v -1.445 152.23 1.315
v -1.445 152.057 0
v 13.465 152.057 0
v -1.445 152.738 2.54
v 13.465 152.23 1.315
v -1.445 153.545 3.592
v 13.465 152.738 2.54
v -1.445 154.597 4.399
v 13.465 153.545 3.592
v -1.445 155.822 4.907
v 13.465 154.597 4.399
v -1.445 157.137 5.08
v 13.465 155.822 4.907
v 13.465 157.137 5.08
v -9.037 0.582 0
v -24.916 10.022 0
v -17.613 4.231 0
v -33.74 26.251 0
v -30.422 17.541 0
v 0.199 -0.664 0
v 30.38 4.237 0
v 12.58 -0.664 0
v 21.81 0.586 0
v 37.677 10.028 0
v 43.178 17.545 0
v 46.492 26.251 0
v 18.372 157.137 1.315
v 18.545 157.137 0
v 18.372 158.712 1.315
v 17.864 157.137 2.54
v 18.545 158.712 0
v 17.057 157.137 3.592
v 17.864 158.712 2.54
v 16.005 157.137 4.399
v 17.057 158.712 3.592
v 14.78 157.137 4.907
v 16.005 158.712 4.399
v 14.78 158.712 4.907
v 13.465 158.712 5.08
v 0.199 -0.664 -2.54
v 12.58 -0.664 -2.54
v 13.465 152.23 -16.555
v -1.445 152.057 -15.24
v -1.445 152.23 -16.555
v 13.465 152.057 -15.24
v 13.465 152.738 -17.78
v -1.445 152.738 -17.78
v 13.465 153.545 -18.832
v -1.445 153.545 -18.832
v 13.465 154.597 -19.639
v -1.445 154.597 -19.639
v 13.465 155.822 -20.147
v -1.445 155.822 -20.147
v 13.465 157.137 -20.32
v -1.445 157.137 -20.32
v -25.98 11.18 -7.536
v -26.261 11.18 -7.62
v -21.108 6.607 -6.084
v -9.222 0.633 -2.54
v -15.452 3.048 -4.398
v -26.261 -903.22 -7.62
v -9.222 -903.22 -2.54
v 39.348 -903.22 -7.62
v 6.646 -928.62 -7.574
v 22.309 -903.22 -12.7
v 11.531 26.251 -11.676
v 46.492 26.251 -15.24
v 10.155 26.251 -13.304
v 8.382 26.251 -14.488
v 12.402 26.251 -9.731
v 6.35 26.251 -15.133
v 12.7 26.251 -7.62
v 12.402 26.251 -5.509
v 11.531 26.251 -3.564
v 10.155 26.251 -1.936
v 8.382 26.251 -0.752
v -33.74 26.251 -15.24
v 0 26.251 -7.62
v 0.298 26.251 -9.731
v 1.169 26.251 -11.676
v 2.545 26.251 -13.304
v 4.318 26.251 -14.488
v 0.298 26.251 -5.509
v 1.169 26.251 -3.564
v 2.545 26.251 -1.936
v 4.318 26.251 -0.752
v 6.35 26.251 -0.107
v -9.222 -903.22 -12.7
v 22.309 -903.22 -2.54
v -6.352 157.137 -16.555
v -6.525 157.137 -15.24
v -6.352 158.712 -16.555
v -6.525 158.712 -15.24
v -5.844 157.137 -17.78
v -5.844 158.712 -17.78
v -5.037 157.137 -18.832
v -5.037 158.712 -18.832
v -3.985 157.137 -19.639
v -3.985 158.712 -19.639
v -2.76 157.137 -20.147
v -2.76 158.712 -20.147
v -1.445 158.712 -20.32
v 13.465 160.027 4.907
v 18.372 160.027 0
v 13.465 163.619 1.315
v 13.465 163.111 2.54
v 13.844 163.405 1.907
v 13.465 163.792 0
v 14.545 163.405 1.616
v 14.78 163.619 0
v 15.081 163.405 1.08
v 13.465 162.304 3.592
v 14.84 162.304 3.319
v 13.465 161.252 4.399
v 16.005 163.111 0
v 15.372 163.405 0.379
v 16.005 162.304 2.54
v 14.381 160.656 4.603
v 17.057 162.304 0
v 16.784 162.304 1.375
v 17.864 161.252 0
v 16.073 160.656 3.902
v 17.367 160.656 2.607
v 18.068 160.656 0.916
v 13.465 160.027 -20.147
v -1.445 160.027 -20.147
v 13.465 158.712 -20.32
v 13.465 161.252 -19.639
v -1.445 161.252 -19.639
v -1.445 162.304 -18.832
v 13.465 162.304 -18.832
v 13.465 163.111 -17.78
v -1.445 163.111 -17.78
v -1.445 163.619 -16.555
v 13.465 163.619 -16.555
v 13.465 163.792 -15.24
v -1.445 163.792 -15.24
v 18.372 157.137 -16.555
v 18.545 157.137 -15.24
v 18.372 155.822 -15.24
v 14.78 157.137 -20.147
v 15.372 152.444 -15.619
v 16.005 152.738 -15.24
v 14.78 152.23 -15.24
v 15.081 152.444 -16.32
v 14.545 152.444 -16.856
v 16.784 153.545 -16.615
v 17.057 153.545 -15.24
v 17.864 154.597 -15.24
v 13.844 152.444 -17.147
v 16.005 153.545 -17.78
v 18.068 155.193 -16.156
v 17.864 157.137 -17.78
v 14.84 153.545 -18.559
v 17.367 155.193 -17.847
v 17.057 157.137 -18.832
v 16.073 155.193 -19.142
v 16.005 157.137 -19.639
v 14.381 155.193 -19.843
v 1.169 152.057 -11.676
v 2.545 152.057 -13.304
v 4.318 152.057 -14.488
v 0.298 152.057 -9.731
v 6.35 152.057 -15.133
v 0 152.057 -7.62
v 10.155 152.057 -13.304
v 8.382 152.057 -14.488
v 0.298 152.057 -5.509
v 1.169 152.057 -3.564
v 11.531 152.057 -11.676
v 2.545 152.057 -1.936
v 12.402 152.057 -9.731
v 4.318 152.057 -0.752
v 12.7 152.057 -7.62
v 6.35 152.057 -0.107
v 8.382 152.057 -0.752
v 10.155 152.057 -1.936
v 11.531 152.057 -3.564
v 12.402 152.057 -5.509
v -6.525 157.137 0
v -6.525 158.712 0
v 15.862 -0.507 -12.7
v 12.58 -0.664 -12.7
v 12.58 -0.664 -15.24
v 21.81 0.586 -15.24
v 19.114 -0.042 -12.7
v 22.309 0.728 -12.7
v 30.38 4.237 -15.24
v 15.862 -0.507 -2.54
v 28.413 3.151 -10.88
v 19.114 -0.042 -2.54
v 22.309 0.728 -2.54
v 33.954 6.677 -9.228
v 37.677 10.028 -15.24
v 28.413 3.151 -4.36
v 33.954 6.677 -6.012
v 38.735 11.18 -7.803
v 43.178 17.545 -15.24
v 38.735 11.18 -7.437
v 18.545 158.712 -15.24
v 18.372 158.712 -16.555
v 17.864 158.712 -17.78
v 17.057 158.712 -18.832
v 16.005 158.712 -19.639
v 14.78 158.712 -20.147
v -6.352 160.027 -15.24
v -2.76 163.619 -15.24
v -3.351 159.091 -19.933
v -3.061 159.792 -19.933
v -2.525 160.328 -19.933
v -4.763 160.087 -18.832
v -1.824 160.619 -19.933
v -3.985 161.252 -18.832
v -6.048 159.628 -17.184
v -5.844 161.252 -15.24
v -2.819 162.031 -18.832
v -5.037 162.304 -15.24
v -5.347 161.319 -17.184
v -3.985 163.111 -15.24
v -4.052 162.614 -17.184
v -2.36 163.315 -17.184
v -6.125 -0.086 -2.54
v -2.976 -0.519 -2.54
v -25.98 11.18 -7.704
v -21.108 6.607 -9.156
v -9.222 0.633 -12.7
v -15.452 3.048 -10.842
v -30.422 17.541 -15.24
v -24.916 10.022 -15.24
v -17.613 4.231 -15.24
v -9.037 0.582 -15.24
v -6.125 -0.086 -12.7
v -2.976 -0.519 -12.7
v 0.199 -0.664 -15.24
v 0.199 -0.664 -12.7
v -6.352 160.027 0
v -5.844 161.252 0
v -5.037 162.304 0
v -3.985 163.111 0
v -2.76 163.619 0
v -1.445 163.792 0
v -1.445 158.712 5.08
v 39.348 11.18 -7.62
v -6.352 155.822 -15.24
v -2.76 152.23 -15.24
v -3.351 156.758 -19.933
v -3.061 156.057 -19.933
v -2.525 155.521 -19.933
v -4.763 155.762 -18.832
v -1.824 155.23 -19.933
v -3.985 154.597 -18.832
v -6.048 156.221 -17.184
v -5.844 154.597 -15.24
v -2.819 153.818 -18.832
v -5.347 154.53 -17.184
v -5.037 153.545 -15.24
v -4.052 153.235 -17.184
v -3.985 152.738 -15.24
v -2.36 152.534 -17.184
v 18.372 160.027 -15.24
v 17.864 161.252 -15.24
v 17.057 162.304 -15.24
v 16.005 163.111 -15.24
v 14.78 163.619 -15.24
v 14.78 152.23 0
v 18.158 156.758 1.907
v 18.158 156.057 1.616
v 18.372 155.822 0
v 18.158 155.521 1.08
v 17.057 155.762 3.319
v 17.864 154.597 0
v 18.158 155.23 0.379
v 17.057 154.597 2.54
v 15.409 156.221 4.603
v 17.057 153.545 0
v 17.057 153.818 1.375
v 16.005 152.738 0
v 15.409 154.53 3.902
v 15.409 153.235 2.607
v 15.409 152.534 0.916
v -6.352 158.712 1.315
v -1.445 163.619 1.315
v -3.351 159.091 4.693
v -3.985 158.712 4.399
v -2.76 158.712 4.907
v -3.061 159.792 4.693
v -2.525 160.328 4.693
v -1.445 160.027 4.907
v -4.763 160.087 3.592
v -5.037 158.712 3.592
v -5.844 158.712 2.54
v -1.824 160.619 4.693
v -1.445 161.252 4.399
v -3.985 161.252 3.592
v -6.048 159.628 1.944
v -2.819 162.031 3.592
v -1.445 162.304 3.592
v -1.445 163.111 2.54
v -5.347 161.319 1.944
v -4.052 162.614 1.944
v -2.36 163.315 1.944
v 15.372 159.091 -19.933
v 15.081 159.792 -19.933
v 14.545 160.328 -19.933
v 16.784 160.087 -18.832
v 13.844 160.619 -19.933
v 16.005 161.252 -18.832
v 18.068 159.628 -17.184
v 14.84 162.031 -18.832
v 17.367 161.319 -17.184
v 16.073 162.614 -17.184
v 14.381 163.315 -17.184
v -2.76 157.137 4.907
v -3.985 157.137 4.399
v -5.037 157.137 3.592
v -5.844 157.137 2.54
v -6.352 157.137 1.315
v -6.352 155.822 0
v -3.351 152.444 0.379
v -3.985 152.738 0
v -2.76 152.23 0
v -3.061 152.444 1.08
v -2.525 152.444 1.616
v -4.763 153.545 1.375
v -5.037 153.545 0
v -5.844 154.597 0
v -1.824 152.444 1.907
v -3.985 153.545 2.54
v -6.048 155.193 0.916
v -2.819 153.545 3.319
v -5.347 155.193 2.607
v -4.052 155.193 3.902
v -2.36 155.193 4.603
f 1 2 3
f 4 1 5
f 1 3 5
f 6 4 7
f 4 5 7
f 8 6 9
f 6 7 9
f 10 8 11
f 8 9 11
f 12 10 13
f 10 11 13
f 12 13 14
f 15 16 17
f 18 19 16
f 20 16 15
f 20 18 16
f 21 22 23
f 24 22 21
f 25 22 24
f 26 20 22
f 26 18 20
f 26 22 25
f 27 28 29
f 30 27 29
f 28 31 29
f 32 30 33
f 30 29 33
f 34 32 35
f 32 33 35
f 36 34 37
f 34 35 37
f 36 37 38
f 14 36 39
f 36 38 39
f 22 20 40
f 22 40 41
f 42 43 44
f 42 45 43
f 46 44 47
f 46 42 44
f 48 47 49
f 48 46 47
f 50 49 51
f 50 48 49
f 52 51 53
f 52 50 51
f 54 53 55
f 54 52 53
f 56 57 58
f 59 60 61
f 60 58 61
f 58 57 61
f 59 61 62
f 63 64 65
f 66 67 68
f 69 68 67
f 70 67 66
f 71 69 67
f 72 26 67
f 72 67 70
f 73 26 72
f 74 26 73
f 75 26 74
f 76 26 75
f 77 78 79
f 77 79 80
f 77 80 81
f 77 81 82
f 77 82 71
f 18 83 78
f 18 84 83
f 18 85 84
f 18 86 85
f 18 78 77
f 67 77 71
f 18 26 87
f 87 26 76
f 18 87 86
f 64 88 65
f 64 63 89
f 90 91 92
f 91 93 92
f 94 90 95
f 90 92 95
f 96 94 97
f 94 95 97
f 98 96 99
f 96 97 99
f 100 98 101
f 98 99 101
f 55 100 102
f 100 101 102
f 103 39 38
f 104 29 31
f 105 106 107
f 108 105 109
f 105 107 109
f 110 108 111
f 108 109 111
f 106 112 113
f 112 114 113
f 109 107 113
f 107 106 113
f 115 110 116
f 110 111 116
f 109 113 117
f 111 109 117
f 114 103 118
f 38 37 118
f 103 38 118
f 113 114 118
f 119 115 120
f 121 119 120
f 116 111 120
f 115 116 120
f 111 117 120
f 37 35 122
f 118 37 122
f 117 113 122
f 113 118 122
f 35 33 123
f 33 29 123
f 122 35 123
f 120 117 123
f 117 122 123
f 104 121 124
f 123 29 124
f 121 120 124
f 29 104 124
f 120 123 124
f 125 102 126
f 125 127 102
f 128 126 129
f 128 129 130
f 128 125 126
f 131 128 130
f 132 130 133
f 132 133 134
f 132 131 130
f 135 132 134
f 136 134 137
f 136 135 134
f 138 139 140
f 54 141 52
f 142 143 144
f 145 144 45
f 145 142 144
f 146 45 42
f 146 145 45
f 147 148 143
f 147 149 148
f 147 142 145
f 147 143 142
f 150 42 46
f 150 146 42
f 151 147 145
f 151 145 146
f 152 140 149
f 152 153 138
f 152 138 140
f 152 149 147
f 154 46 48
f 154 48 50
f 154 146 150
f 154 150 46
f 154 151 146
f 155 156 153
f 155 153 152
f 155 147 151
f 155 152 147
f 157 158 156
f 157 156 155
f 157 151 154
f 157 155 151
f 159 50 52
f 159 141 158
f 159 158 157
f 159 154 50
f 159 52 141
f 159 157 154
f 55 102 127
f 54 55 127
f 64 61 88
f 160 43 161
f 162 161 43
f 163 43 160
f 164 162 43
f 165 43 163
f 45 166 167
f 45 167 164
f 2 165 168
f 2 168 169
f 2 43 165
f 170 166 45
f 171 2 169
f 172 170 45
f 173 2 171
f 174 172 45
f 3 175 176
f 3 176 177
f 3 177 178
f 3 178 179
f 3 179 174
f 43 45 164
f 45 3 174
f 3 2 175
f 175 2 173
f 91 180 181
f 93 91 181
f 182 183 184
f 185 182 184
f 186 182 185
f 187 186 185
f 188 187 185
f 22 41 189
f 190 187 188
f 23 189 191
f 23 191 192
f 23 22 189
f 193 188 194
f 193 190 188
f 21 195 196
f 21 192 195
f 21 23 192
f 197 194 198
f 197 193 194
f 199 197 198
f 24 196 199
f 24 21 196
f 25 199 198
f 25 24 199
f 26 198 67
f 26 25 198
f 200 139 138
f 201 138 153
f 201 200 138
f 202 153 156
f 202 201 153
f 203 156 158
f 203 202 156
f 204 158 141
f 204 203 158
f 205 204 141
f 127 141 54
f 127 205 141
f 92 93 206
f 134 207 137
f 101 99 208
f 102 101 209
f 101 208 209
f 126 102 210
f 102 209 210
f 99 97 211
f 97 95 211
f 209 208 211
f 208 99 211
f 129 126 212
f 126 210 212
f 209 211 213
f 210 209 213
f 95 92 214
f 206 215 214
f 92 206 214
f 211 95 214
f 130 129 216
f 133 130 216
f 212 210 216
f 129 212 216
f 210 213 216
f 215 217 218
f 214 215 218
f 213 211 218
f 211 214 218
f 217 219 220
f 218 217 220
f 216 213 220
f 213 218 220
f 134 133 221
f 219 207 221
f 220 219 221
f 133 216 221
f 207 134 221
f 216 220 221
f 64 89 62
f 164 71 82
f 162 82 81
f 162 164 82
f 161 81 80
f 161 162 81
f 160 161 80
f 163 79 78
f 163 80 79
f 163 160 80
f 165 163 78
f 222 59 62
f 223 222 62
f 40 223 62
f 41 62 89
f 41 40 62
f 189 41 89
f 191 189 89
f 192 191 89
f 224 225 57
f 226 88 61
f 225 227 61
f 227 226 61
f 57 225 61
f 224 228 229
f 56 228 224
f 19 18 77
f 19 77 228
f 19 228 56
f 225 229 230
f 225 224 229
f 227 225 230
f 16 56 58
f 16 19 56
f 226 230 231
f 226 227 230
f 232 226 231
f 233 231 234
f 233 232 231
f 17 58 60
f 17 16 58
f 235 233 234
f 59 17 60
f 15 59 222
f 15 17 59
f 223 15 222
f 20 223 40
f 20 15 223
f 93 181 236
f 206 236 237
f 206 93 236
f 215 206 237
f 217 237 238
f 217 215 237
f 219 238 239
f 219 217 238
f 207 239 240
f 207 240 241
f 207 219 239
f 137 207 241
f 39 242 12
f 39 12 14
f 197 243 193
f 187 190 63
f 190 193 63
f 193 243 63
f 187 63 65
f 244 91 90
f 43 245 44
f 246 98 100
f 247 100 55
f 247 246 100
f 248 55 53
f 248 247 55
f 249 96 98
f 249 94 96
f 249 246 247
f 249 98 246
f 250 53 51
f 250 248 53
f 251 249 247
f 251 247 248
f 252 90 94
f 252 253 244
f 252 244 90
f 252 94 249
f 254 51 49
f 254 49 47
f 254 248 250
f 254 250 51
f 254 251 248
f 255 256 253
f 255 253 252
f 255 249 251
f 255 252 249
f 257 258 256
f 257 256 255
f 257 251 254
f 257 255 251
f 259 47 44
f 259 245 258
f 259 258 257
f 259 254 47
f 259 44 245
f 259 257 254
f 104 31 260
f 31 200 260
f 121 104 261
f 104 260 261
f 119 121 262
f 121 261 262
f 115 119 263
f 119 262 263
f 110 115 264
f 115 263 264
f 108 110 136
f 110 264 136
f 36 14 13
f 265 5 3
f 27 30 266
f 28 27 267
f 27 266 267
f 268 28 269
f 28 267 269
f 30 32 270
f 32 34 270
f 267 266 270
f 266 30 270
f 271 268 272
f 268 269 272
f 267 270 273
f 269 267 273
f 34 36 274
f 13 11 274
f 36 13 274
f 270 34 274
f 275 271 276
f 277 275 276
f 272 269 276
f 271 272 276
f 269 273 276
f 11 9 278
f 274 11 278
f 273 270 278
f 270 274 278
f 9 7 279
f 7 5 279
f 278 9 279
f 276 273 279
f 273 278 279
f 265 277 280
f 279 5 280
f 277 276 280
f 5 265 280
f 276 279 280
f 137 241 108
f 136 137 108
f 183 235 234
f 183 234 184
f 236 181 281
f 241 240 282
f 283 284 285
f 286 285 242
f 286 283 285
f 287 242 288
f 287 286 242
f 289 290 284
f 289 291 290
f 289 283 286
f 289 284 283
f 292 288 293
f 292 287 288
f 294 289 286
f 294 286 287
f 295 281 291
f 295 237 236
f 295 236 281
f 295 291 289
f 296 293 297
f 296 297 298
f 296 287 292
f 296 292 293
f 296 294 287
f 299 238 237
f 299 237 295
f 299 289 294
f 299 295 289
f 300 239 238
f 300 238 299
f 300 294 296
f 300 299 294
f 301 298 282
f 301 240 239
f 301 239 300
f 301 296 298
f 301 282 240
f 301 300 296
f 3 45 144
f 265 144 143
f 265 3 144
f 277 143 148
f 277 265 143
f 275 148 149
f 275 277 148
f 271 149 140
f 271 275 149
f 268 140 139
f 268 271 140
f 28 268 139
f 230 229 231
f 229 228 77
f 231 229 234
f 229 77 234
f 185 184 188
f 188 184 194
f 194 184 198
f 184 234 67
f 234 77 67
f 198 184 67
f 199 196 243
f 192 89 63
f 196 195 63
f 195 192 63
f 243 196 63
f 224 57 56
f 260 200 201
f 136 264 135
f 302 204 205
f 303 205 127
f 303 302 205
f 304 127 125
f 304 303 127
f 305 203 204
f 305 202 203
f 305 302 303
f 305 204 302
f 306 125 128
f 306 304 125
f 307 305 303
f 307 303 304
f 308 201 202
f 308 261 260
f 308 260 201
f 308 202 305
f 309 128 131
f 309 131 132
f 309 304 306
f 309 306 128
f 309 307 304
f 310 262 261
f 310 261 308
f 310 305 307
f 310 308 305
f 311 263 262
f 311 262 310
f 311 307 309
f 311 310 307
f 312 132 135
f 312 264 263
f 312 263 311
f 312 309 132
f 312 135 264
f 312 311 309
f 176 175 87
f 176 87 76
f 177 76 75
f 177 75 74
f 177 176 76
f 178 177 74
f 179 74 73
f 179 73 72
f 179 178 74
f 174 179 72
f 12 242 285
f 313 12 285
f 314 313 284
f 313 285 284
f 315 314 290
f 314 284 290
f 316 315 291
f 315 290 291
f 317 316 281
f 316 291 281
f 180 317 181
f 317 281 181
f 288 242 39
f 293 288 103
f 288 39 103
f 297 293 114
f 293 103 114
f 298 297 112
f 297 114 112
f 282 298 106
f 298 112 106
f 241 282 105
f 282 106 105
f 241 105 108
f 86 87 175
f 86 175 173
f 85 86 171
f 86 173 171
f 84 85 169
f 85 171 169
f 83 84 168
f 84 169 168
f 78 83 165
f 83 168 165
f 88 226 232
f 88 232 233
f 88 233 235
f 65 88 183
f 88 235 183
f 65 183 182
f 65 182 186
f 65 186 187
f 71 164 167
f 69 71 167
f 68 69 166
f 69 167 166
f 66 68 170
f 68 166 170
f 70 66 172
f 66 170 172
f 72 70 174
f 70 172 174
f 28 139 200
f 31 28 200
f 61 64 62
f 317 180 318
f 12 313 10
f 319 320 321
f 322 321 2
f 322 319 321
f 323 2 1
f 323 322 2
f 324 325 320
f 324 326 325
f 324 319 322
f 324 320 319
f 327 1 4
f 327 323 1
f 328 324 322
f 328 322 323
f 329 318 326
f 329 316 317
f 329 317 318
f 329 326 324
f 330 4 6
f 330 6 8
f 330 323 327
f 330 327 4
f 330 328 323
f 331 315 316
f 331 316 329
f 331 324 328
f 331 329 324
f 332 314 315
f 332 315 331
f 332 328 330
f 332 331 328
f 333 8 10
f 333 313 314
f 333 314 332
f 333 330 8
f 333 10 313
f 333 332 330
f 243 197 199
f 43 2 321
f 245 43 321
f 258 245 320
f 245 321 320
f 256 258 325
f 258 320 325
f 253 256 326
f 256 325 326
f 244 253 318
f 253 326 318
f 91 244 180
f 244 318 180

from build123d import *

# Parameters (mm, degrees)
F0_W          = 152.4
F0_H          = 15.24
F1_DEPTH      = 12.7
F2_T1_DEPTH   = 190.5
F4_W          = 25.0697992742
F4_H          = 11.7348134518
F5_DEPTH      = 12.7
F5_DEPTH_BACK = 12.7
F7_DEPTH      = 7.62
F7_DEPTH_BACK = 7.62
F8_W          = 65.6082034111
F8_H          = 914.4
F9_DEPTH      = 5.08
F9_DEPTH_BACK = 5.08
F11_DEPTH     = 914.4
F12_DEPTH     = 12.7
F16_R         = 5.08


# Not quite as in the source:
# - a fillet or chamfer that OpenCascade refuses, or shapes differently, is made with other operations: its cross-section is extruded or revolved along the edge and cut away or added


with BuildPart() as f1:
    # F0 (on Right) → F1 (new body)
    with BuildSketch(Plane.YZ):
        with Locations((76.2, -7.62)):
            Rectangle(F0_W, F0_H)
    extrude(amount=F1_DEPTH)

    # F2: fillet of radius 7.62 on 4 edges, made by hand

    # F2_s2 → F2_t1 (cut)
    with BuildSketch(Plane.XZ.offset(-171.45)):
        with BuildLine():
            ThreePointArc((7.62, 0), (2.2318463274, -2.2318463274), (0, -7.62))
            Line((0, -7.62), (0, 0))
            Line((0, 0), (7.62, 0))
        make_face()
        with BuildLine():
            ThreePointArc((7.62, -15.24), (2.2318463274, -13.0081536726), (0, -7.62))
            Line((0, -7.62), (0, -15.24))
            Line((0, -15.24), (7.62, -15.24))
        make_face()
        with BuildLine():
            ThreePointArc((5.08, 0), (10.4681536726, -2.2318463274), (12.7, -7.62))
            Line((12.7, -7.62), (12.7, 0))
            Line((12.7, 0), (5.08, 0))
        make_face()
        with BuildLine():
            ThreePointArc((5.08, -15.24), (10.4681536726, -13.0081536726), (12.7, -7.62))
            Line((12.7, -7.62), (12.7, -15.24))
            Line((12.7, -15.24), (5.08, -15.24))
        make_face()
    extrude(amount=F2_T1_DEPTH, mode=Mode.SUBTRACT)

    # F4 (on offset) → F5 (join, two sides)
    with BuildSketch(Plane.XY.offset(-7.62)) as f5_sk:
        with Locations((6.0101542622, 157.924503088)):
            Rectangle(F4_W, F4_H)
    extrude(amount=F5_DEPTH)
    extrude(f5_sk.sketch, amount=-F5_DEPTH_BACK)

    # F6 (on offset) → F7 (join, two sides)
    with BuildSketch(Plane.XY.offset(-7.62)) as f7_sk:
        with BuildLine():
            Line((6.3893780661, -0.6641601572), (12.5797659928, -0.6641601572))
            ThreePointArc((12.5797659928, -0.6641601572), (34.2227463889, 6.8879561013), (46.4923181534, 26.2505661817))
            Line((46.4923181534, 26.2505661817), (6.3893780661, 26.2505661817))
            Line((6.3893780661, 26.2505661817), (6.3893780661, -0.6641601572))
        make_face()
        with BuildLine():
            Line((0.1989901393, -0.6641601572), (6.3893780661, -0.6641601572))
            Line((6.3893780661, -0.6641601572), (6.3893780661, 26.2505661817))
            Line((6.3893780661, 26.2505661817), (-33.7397263339, 26.2505661817))
            ThreePointArc((-33.7397263339, 26.2505661817), (-21.4587969692, 6.8812254508), (0.1989901393, -0.6641601572))
        make_face()
    extrude(amount=F7_DEPTH)
    extrude(f7_sk.sketch, amount=-F7_DEPTH_BACK)

    # F8 (on offset) → F9 (join, two sides)
    with BuildSketch(Plane.XY.offset(-7.62)) as f9_sk:
        with Locations((6.5435543656, -446.0204662129)):
            Rectangle(F8_W, F8_H)
    extrude(amount=-F9_DEPTH)
    extrude(f9_sk.sketch, amount=F9_DEPTH_BACK)

    # F10 (on face) → F11 (cut)
    with BuildSketch(Plane.XZ.offset(903.2204662129)):
        Polygon((-26.2605473399, -2.54), (-26.2605473399, -7.62), (-9.2217093514, -2.54), align=None)
        Polygon((-9.2217093514, -12.7), (-26.2605473399, -7.62), (-26.2605473399, -12.7), align=None)
        Polygon((39.3476560712, -7.62), (22.3088180826, -12.7), (39.3476560712, -12.7), align=None)
        Polygon((39.3476560712, -2.54), (22.3088180826, -2.54), (39.3476560712, -7.62), align=None)
    extrude(amount=-F11_DEPTH, mode=Mode.SUBTRACT)

    # F12 (add): a face of the model
    f12_faces = [f1.faces().sort_by_distance(p)[0] for p in [
        (6.3771735992, 14.5847815456, 0),
    ]]
    extrude(f12_faces, amount=-F12_DEPTH)

    # F9_face (on face) → F15 section 0
    with BuildSketch(Plane(origin=(6.5435543656, -903.2204662129, -7.62), x_dir=(1, 0, 0), z_dir=(0, -1, 0)), mode=Mode.PRIVATE) as f15_s0:
        Polygon((-32.8041017056, 0), (-15.765263717, -5.08), (15.765263717, -5.08), (32.8041017056, 0), (15.765263717, 5.08), (-15.765263717, 5.08), align=None)
    loft([f15_s0.sketch, Vertex(6.6463528201, -928.6204662129, -7.5741349719)])

    # F16
    f16_edges = [f1.edges().sort_by_distance(p)[0] for p in [
        (-6.524745, 163.79191, -7.62),
        (-6.524745, 157.924503, 5.08),
        (-6.524745, 152.057096, -7.62),
        (-6.524745, 157.924503, -20.32),
        (6.010154, 152.057096, 5.08),
        (18.545054, 157.924503, 5.08),
        (6.010154, 163.79191, 5.08),
        (18.545054, 163.79191, -7.62),
        (18.545054, 157.924503, -20.32),
        (18.545054, 152.057096, -7.62),
        (6.010154, 152.057096, -20.32),
        (6.010154, 163.79191, -20.32),
    ]]
    fillet(f16_edges, radius=F16_R)


solid = f1.part
